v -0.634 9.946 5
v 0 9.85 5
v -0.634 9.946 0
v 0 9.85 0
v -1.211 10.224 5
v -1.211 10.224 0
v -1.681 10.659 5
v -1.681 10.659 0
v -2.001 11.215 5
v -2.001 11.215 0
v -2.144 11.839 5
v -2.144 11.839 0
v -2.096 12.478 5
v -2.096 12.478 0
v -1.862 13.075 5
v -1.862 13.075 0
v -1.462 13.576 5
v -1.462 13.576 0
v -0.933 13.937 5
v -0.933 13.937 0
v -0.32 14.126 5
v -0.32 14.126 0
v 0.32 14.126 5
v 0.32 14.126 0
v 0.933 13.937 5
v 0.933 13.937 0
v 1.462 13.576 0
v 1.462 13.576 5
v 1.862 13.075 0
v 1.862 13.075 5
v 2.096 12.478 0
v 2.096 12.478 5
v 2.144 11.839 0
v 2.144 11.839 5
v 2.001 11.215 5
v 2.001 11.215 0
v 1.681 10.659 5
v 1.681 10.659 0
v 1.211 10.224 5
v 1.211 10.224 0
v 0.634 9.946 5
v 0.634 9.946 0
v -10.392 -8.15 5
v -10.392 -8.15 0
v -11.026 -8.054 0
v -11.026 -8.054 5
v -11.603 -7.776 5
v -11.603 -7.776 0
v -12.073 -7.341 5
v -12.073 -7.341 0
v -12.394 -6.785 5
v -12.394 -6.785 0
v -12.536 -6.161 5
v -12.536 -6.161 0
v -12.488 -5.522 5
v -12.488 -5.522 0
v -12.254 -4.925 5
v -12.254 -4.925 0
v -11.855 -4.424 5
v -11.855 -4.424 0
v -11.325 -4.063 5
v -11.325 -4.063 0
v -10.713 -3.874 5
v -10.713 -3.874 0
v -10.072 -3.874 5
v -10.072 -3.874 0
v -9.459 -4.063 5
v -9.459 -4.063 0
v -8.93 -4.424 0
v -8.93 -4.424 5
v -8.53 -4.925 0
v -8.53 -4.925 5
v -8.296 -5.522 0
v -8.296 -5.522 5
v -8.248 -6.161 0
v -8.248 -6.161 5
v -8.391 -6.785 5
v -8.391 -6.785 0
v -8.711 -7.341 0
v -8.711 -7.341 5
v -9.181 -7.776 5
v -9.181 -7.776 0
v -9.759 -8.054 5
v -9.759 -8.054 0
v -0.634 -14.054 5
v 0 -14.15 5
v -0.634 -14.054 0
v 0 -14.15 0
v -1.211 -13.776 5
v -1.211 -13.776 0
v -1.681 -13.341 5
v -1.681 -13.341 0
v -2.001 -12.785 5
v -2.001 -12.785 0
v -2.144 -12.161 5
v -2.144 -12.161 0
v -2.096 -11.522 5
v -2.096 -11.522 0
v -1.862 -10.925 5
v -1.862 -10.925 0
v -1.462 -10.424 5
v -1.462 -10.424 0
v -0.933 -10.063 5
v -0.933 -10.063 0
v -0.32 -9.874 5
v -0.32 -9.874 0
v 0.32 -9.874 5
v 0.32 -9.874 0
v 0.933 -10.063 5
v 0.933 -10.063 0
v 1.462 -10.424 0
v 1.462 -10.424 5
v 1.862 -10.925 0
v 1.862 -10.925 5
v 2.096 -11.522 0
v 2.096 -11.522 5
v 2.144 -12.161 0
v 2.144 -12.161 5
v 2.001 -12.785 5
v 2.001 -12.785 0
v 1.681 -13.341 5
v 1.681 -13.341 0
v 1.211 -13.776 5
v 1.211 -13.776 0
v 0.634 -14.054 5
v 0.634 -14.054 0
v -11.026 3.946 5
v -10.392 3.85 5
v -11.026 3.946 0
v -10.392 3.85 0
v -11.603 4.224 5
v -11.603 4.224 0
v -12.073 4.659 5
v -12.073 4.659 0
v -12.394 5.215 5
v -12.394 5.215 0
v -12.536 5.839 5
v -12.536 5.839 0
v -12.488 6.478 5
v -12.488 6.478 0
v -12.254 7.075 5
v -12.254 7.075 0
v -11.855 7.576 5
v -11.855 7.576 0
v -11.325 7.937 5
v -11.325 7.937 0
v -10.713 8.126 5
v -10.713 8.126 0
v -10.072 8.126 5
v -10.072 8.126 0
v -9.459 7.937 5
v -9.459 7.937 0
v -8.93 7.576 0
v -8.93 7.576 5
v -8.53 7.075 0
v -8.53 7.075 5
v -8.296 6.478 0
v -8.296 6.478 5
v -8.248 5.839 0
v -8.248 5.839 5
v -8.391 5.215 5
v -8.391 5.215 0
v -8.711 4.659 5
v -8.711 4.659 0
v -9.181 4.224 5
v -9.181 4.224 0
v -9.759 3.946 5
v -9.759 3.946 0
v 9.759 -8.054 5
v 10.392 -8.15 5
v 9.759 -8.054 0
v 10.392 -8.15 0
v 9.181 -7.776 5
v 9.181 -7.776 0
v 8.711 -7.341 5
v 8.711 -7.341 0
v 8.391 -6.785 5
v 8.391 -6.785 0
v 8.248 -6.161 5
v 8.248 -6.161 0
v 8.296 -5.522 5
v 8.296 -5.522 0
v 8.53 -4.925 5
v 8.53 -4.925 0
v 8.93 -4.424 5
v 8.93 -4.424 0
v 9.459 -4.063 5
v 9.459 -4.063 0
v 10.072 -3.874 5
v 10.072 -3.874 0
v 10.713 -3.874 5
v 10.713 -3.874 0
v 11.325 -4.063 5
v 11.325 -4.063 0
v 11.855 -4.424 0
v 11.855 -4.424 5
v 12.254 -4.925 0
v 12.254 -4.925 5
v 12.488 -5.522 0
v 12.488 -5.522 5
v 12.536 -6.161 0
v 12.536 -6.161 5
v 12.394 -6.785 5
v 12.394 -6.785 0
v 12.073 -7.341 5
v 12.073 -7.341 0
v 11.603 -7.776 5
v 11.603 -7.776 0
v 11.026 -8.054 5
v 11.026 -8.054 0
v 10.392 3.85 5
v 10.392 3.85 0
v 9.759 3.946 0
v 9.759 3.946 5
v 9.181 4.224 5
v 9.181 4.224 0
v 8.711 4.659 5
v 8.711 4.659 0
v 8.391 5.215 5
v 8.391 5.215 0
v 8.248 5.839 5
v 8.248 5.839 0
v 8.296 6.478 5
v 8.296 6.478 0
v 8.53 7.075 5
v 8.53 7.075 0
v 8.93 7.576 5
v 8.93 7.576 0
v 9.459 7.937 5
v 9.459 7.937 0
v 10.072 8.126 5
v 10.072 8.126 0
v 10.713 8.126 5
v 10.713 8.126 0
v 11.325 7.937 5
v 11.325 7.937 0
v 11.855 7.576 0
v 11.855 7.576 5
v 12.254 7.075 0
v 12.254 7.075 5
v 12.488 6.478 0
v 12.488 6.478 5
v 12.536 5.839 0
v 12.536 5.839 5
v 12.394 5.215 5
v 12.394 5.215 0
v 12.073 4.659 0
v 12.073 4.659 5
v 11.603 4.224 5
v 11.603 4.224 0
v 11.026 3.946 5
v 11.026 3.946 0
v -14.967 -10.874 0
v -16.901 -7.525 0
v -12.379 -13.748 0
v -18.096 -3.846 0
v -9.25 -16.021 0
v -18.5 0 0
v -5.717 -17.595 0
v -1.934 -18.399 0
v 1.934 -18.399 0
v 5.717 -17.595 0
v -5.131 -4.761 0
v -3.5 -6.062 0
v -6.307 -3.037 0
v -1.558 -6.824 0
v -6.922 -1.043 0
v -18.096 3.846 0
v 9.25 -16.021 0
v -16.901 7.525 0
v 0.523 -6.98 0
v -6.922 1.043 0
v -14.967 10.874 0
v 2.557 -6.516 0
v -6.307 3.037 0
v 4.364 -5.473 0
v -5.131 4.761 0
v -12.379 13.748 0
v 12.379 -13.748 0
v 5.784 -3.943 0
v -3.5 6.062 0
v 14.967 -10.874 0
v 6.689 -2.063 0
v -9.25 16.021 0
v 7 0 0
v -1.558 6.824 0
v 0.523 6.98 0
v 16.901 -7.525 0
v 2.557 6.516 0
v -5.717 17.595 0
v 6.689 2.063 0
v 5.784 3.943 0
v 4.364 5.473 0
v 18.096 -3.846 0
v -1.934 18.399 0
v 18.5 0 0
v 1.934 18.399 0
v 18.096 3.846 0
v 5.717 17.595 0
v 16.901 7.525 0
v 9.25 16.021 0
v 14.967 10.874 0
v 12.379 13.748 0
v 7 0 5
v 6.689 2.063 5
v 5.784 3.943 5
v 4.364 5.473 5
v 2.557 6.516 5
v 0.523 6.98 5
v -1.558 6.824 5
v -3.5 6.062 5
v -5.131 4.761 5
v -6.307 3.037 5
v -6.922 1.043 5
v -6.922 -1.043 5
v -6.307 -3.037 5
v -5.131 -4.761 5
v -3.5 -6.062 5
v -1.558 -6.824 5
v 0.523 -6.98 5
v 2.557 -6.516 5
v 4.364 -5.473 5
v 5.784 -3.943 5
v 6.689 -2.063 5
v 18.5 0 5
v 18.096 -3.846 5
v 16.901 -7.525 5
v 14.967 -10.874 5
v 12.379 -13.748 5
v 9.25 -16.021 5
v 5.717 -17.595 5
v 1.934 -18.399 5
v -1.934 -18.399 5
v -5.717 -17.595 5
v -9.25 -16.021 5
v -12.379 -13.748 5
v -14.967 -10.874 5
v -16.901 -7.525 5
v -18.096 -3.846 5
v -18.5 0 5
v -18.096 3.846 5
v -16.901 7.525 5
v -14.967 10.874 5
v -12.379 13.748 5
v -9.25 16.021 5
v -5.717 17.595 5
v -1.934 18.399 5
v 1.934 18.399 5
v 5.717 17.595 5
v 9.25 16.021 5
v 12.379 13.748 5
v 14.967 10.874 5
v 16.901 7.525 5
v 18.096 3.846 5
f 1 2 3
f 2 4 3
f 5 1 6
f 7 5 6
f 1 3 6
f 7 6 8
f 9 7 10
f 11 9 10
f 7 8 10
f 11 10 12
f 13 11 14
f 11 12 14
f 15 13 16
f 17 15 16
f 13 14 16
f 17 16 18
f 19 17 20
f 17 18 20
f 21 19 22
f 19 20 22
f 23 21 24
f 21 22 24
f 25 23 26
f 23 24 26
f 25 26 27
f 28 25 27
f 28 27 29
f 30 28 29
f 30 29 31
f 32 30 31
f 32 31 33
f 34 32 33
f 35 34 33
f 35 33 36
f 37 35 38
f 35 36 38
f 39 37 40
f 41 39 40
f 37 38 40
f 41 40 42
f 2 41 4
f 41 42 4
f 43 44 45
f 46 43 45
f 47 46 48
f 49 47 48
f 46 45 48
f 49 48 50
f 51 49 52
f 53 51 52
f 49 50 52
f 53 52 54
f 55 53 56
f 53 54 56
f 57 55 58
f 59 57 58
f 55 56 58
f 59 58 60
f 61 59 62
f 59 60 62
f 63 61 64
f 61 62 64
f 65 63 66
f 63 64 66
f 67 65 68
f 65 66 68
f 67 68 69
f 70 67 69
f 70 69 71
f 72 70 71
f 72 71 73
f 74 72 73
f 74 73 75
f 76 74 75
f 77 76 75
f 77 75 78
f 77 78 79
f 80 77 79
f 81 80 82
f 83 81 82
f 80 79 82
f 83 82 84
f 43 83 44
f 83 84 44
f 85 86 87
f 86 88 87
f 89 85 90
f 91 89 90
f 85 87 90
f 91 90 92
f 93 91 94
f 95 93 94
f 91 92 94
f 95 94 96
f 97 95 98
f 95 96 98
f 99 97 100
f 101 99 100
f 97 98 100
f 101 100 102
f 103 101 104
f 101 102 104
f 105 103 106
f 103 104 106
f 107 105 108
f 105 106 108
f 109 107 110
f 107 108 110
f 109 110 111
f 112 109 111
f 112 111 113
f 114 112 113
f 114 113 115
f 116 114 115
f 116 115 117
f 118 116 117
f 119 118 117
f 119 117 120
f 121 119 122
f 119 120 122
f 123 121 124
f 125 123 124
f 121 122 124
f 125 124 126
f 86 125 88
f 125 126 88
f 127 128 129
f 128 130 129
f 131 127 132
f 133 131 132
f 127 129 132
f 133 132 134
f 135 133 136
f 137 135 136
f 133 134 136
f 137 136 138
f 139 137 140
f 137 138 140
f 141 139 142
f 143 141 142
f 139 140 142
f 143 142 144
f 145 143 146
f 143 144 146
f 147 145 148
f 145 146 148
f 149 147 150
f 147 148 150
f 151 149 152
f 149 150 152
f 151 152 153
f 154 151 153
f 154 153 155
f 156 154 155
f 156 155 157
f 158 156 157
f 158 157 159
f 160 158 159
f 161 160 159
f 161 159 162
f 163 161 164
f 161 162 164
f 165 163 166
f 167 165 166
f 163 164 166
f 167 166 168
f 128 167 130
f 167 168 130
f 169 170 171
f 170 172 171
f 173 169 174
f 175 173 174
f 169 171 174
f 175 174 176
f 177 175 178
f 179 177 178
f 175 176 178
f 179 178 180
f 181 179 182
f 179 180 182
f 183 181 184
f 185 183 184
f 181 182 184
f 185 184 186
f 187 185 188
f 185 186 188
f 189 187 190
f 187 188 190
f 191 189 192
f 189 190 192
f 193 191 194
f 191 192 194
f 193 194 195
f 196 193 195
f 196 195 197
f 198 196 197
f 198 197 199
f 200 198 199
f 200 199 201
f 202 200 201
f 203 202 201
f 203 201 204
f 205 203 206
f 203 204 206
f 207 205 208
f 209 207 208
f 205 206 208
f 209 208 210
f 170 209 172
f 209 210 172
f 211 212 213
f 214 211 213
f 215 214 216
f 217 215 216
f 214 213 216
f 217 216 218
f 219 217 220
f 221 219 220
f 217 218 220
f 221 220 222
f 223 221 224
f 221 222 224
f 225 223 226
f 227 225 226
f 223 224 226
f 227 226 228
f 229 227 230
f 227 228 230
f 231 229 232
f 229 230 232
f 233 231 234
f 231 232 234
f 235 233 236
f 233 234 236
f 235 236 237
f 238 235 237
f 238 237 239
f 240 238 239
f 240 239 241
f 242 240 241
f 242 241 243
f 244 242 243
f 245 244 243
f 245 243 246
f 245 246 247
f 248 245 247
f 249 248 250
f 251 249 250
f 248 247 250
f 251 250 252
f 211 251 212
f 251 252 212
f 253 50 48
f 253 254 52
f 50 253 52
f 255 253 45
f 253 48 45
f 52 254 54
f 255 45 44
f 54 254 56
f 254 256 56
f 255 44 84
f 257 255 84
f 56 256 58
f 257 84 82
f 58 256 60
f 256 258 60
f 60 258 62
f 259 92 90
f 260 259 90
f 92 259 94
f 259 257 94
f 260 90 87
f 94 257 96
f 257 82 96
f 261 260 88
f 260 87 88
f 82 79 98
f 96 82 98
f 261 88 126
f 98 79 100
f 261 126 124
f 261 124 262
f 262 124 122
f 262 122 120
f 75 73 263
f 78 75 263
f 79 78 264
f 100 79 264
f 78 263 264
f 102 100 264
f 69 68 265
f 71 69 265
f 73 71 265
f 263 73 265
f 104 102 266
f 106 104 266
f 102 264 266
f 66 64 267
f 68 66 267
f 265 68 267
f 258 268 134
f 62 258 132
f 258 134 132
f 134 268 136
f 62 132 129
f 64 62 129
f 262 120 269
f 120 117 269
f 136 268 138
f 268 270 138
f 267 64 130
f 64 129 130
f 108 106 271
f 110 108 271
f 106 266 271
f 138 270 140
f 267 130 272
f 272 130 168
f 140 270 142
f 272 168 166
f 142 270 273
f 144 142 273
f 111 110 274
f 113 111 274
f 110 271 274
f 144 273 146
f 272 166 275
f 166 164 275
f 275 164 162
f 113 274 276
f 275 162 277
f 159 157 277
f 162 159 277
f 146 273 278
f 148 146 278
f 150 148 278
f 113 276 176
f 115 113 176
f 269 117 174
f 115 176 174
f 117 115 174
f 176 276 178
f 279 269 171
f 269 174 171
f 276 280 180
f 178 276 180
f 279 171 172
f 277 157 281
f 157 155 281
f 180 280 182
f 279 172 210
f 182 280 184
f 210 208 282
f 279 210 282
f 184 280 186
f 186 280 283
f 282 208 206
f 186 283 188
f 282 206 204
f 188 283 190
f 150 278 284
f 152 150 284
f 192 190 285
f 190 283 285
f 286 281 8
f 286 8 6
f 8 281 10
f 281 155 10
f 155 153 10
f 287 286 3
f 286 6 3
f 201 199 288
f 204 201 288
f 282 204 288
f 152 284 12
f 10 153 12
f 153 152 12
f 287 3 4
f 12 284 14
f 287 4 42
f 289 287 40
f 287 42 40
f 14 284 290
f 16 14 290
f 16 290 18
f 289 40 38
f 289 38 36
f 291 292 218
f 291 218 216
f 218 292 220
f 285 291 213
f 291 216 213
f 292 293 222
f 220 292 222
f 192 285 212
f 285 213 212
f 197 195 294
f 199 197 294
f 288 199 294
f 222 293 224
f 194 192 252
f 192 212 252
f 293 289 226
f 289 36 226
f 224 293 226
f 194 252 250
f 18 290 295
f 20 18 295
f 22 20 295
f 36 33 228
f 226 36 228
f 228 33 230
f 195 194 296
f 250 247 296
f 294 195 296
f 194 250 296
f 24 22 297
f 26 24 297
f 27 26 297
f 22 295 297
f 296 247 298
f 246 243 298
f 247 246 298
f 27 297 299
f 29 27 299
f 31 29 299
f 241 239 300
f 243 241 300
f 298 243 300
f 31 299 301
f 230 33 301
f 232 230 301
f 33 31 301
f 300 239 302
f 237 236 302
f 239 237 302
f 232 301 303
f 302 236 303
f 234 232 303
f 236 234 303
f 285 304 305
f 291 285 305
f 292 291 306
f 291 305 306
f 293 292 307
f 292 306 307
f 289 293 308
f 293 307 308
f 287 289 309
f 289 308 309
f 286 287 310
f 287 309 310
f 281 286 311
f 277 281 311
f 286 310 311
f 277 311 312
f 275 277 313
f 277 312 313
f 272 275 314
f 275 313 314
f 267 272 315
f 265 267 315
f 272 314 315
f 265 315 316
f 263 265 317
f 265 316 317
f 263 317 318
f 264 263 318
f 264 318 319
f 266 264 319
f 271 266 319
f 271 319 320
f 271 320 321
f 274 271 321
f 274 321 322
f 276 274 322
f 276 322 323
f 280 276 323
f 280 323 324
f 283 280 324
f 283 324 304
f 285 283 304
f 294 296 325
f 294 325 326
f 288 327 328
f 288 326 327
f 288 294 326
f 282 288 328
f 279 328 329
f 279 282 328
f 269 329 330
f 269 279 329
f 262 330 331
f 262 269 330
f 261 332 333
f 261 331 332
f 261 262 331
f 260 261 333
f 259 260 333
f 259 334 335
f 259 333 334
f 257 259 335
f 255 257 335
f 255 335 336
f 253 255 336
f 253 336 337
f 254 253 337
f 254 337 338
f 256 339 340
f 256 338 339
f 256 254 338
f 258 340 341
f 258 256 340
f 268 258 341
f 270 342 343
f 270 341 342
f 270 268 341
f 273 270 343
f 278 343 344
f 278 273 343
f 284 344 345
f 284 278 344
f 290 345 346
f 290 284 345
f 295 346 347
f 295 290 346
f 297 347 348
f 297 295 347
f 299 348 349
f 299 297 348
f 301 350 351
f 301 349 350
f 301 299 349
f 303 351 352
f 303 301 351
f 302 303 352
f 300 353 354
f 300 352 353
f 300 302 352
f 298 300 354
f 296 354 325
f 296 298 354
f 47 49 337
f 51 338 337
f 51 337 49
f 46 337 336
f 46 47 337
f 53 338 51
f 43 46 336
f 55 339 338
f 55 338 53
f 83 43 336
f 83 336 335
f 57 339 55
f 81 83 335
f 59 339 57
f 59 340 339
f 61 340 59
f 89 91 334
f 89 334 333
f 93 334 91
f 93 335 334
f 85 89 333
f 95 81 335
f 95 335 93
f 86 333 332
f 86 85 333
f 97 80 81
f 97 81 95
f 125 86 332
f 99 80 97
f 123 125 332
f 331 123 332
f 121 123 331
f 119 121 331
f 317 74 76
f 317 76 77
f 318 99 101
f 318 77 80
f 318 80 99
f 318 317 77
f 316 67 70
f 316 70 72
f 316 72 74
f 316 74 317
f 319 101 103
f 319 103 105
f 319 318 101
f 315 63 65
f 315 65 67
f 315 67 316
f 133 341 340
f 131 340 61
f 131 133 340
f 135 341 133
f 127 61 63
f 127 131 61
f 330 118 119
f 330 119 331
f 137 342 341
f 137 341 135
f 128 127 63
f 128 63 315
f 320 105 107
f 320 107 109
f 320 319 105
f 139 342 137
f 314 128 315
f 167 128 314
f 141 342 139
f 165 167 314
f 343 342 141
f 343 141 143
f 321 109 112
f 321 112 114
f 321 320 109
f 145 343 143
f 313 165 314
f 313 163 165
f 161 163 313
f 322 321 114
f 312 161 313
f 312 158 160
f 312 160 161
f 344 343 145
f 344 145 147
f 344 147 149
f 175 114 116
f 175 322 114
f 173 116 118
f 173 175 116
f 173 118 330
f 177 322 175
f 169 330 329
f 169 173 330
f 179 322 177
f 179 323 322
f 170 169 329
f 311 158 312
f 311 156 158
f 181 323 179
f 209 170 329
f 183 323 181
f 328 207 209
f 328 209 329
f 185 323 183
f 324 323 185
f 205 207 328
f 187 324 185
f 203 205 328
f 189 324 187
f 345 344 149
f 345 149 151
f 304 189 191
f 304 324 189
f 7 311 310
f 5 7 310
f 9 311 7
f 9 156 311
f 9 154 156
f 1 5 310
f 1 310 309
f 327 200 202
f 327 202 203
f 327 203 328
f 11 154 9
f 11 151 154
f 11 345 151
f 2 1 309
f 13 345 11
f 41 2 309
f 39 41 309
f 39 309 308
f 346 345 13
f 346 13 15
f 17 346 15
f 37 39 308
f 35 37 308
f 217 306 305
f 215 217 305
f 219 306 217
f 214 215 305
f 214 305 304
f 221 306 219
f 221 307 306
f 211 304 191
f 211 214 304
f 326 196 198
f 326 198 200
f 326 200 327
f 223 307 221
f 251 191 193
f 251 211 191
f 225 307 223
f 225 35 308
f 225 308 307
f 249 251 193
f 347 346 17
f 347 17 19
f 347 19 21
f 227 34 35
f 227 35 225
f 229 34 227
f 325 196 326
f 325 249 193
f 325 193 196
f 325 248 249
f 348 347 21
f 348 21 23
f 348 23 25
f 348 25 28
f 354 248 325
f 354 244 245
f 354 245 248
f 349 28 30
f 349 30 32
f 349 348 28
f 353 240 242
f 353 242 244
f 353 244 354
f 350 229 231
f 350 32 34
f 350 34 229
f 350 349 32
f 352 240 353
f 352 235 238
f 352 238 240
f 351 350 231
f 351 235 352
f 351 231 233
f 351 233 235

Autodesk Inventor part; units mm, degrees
ref_plane "YZ Plane" through (0, 0, 0) normal (1, 0, 0) x (0, 1, 0)
ref_plane "XZ Plane" through (0, 0, 0) normal (0, 1, 0) x (-1, 0, 0)
ref_plane "XY Plane" through (0, 0, 0) normal (0, 0, 1) x (1, 0, 0)
sketch "スケッチ1" plane through (0, 0, 0) normal (0, 0, 1) x (1, 0, 0)
  circle A0 centre (0, 0) radius 18.5
  dimension "d0" = 37
extrude "押し出し1" add sketch "スケッチ1" along normal blind 5
sketch "スケッチ2" plane through (0, 0, 5) normal (0, 0, 1) x (1, 0, 0)
  circle A0 centre (0, 0) radius 12
  point P0 (0, 12)
  point P1 (-10.3923, 6)
  point P2 (-10.3923, -6)
  point P3 (0, -12)
  point P4 (10.3923, -6)
  point P5 (10.3923, 6)
  dimension "d3" = 24
  dimension "d6" = 360
hole "穴1" at (0, 12, 5) at (-10.3923, 6, 5) at (-10.3923, -6, 5) at (0, -12, 5) at (10.3923, -6, 5) at (10.3923, 6, 5) direction (0, 0, -1) diameter 4.3 end through all
sketch "スケッチ3" plane through (0, 0, 5) normal (0, 0, 1) x (1, 0, 0)
  circle A0 centre (0, 0) radius 7
  dimension "d15" = 14
extrude "押し出し2" cut sketch "スケッチ3" against normal blind 5
properties part number "servoplate_forR6" material "アルミニウム 6061"
